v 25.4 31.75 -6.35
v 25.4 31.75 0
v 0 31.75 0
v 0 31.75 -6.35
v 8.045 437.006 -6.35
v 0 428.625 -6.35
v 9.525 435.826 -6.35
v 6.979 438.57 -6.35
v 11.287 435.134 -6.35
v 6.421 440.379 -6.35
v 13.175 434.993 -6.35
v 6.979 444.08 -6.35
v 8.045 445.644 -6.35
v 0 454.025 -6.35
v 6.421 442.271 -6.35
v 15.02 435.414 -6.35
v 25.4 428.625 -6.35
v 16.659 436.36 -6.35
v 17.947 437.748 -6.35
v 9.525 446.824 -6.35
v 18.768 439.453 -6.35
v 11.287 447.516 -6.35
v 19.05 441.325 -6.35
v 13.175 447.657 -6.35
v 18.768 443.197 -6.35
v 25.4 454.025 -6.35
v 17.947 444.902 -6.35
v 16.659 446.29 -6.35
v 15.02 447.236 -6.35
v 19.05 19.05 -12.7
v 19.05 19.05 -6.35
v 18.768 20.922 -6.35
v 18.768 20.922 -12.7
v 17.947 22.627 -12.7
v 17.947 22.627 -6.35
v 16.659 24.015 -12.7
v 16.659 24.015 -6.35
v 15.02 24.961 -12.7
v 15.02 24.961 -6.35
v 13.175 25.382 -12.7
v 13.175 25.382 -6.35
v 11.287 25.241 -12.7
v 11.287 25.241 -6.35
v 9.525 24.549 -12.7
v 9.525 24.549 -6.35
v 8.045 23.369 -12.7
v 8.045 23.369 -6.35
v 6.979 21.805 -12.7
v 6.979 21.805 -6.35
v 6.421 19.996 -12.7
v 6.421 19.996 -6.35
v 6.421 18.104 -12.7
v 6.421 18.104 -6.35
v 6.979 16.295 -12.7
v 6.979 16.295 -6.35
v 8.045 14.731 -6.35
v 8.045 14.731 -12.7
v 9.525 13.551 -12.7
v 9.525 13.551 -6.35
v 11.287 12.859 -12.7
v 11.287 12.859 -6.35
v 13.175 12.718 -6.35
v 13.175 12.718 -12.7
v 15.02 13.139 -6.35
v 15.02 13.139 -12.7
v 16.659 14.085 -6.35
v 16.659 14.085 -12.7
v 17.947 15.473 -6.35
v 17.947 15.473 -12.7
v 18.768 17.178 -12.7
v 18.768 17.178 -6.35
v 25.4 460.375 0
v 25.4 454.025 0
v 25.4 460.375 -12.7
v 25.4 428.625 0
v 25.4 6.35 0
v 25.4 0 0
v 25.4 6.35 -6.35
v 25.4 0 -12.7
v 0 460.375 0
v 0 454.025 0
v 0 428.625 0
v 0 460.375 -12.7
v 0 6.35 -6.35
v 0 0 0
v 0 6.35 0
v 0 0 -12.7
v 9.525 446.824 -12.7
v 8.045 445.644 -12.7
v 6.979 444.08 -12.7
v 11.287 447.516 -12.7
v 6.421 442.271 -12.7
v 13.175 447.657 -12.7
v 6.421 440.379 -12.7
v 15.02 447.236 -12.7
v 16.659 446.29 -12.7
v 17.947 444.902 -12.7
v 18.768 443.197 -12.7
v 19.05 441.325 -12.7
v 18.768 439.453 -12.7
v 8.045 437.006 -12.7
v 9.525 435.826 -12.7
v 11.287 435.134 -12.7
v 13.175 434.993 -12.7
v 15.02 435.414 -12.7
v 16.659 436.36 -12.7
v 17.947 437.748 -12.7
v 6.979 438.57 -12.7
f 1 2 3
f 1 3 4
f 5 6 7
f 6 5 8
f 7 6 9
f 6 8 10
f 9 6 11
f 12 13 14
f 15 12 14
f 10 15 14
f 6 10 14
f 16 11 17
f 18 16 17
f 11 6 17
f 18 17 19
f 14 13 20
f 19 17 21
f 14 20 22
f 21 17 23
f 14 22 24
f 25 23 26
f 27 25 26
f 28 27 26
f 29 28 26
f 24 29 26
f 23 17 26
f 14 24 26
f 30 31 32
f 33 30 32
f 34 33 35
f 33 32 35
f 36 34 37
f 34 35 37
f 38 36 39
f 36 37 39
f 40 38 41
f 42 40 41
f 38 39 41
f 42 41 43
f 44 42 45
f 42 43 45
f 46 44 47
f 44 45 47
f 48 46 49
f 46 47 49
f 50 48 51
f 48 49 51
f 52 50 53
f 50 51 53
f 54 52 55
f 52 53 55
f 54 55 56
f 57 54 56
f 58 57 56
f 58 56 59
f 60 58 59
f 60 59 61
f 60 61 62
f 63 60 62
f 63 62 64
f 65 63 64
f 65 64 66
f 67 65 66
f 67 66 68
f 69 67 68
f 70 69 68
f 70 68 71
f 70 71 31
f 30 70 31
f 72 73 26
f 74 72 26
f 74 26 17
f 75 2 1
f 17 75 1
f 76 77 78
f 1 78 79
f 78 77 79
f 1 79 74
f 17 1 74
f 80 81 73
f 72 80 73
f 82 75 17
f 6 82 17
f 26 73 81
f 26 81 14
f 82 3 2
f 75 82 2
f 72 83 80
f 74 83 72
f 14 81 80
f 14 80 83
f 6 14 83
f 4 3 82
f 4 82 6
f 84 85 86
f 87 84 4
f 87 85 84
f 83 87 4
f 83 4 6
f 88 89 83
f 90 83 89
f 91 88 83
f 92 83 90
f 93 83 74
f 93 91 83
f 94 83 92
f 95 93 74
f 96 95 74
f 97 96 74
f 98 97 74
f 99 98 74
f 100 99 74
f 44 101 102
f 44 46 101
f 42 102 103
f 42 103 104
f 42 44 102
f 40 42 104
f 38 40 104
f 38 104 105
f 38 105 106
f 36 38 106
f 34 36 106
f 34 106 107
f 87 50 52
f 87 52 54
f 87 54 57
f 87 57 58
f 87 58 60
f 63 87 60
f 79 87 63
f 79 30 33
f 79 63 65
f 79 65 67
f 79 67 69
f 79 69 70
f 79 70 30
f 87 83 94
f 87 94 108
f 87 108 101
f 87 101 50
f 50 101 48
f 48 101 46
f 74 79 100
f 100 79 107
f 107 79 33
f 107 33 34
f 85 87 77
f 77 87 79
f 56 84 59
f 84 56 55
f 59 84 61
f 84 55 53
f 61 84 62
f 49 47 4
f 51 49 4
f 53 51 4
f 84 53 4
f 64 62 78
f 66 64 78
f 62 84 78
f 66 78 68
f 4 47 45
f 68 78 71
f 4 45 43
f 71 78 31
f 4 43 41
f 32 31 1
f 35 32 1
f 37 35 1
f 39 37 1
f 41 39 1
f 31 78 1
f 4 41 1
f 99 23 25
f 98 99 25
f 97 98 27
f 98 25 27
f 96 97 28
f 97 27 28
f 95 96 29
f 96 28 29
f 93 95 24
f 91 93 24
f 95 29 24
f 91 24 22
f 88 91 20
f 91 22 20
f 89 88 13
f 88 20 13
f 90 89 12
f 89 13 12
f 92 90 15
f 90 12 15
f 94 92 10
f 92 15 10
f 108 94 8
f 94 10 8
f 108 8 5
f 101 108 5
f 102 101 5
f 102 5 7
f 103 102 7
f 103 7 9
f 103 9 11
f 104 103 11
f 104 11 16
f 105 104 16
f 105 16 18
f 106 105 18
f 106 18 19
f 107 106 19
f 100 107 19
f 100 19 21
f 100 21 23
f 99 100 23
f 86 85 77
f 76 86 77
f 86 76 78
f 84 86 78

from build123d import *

# Parameters (mm, degrees)
SKETCH1_W           = 25.4
SKETCH1_H           = 12.7
BOSS_EXTRUDE1_DEPTH = 460.375
SKETCH2_W           = 6.35
SKETCH2_H           = 25.4
CUT_EXTRUDE1_DEPTH  = 462.250030488
SKETCH3_R           = 6.35
CUT_EXTRUDE2_DEPTH  = 462.11888177


with BuildPart() as part:
    # Sketch1 → Boss-Extrude1 (new body)
    with BuildSketch(Plane(origin=(0, 0, 0), x_dir=(1, 0, 0), z_dir=(0, 1, 0))):
        with Locations((12.7, 6.35)):
            Rectangle(SKETCH1_W, SKETCH1_H)
    extrude(amount=BOSS_EXTRUDE1_DEPTH)

    # Sketch2 → Cut-Extrude1 (cut, through all)
    with BuildSketch(Plane(origin=(25.4, 0, 0), x_dir=(0, 0, -1), z_dir=(1, 0, 0))):
        with Locations((3.175, 441.325)):
            Rectangle(SKETCH2_W, SKETCH2_H)
        with Locations((3.175, 19.05)):
            Rectangle(SKETCH2_W, SKETCH2_H)
    extrude(amount=-CUT_EXTRUDE1_DEPTH, mode=Mode.SUBTRACT)

    # Sketch3 → Cut-Extrude2 (cut, through all)
    with BuildSketch(Plane.XY.offset(-6.35)):
        with Locations((12.7, 441.325)):
            Circle(SKETCH3_R)
        with Locations((12.7, 19.05)):
            Circle(SKETCH3_R)
    extrude(amount=-CUT_EXTRUDE2_DEPTH, mode=Mode.SUBTRACT)


solid = part.part
